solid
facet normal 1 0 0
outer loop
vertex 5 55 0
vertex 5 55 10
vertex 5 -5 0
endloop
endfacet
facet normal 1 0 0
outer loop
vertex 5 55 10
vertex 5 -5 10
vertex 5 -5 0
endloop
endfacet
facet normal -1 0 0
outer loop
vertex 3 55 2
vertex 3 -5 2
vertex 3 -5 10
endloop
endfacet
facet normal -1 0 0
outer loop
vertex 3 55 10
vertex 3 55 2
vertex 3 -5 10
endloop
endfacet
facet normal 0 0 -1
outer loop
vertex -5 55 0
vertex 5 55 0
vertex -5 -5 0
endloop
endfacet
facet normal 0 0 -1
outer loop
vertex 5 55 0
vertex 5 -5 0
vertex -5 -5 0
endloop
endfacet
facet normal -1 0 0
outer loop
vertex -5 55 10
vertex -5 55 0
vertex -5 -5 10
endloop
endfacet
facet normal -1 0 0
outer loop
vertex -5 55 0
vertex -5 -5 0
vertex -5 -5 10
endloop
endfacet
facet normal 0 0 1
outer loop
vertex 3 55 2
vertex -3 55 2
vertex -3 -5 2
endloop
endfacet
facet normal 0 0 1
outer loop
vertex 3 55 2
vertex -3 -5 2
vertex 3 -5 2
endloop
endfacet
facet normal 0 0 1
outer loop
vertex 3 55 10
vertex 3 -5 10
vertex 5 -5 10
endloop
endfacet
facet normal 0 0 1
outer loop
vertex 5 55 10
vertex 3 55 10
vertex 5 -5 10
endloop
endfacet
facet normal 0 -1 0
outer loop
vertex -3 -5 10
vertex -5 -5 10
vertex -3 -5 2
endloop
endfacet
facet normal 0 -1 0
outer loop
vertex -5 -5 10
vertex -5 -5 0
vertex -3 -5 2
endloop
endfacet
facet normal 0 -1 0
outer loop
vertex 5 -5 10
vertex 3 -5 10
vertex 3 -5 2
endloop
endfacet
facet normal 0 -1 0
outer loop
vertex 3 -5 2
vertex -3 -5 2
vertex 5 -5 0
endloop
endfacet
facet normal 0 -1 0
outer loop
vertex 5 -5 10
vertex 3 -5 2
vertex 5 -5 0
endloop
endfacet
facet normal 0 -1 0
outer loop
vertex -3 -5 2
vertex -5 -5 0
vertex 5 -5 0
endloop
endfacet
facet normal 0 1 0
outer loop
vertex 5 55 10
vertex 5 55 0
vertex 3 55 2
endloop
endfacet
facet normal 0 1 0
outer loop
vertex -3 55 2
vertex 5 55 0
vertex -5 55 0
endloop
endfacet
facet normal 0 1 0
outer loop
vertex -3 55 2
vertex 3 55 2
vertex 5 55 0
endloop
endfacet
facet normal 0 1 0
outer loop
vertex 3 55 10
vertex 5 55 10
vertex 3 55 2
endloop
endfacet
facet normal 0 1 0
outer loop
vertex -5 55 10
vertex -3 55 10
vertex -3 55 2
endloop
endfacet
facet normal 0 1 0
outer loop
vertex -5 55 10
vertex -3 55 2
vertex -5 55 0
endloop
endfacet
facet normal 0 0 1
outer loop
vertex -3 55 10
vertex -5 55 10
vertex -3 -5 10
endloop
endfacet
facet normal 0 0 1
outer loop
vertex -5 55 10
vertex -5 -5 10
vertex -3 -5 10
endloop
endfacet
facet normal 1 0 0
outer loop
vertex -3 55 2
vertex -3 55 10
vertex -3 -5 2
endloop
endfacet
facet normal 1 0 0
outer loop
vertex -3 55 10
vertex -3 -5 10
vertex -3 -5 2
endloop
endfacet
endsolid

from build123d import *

# Parameters (mm, degrees)
F0_W     = 10
F0_H     = 10
F1_DEPTH = 2
F2_W     = 2
F2_H     = 10
F3_DEPTH = 8
F5_DEPTH = 50


with BuildPart() as f1:
    # F0 (on Top) → F1 (new body)
    with BuildSketch(Plane.XY):
        Rectangle(F0_W, F0_H)
    extrude(amount=F1_DEPTH)

    # F2 (on face) → F3 (join)
    with BuildSketch(Plane.XY.offset(2)):
        with Locations((-4, 0)):
            Rectangle(F2_W, F2_H)
        with Locations((4, 0)):
            Rectangle(F2_W, F2_H)
    extrude(amount=F3_DEPTH)

    # F4 (on face) → F5 (join)
    with BuildSketch(Plane(origin=(0, 5, 0), x_dir=(-1, 0, 0), z_dir=(0, 1, 0))):
        Polygon((-3, 10), (-5, 10), (-5, 0), (5, 0), (5, 10), (3, 10), (3, 2), (-3, 2), align=None)
    extrude(amount=F5_DEPTH)


solid = f1.part
